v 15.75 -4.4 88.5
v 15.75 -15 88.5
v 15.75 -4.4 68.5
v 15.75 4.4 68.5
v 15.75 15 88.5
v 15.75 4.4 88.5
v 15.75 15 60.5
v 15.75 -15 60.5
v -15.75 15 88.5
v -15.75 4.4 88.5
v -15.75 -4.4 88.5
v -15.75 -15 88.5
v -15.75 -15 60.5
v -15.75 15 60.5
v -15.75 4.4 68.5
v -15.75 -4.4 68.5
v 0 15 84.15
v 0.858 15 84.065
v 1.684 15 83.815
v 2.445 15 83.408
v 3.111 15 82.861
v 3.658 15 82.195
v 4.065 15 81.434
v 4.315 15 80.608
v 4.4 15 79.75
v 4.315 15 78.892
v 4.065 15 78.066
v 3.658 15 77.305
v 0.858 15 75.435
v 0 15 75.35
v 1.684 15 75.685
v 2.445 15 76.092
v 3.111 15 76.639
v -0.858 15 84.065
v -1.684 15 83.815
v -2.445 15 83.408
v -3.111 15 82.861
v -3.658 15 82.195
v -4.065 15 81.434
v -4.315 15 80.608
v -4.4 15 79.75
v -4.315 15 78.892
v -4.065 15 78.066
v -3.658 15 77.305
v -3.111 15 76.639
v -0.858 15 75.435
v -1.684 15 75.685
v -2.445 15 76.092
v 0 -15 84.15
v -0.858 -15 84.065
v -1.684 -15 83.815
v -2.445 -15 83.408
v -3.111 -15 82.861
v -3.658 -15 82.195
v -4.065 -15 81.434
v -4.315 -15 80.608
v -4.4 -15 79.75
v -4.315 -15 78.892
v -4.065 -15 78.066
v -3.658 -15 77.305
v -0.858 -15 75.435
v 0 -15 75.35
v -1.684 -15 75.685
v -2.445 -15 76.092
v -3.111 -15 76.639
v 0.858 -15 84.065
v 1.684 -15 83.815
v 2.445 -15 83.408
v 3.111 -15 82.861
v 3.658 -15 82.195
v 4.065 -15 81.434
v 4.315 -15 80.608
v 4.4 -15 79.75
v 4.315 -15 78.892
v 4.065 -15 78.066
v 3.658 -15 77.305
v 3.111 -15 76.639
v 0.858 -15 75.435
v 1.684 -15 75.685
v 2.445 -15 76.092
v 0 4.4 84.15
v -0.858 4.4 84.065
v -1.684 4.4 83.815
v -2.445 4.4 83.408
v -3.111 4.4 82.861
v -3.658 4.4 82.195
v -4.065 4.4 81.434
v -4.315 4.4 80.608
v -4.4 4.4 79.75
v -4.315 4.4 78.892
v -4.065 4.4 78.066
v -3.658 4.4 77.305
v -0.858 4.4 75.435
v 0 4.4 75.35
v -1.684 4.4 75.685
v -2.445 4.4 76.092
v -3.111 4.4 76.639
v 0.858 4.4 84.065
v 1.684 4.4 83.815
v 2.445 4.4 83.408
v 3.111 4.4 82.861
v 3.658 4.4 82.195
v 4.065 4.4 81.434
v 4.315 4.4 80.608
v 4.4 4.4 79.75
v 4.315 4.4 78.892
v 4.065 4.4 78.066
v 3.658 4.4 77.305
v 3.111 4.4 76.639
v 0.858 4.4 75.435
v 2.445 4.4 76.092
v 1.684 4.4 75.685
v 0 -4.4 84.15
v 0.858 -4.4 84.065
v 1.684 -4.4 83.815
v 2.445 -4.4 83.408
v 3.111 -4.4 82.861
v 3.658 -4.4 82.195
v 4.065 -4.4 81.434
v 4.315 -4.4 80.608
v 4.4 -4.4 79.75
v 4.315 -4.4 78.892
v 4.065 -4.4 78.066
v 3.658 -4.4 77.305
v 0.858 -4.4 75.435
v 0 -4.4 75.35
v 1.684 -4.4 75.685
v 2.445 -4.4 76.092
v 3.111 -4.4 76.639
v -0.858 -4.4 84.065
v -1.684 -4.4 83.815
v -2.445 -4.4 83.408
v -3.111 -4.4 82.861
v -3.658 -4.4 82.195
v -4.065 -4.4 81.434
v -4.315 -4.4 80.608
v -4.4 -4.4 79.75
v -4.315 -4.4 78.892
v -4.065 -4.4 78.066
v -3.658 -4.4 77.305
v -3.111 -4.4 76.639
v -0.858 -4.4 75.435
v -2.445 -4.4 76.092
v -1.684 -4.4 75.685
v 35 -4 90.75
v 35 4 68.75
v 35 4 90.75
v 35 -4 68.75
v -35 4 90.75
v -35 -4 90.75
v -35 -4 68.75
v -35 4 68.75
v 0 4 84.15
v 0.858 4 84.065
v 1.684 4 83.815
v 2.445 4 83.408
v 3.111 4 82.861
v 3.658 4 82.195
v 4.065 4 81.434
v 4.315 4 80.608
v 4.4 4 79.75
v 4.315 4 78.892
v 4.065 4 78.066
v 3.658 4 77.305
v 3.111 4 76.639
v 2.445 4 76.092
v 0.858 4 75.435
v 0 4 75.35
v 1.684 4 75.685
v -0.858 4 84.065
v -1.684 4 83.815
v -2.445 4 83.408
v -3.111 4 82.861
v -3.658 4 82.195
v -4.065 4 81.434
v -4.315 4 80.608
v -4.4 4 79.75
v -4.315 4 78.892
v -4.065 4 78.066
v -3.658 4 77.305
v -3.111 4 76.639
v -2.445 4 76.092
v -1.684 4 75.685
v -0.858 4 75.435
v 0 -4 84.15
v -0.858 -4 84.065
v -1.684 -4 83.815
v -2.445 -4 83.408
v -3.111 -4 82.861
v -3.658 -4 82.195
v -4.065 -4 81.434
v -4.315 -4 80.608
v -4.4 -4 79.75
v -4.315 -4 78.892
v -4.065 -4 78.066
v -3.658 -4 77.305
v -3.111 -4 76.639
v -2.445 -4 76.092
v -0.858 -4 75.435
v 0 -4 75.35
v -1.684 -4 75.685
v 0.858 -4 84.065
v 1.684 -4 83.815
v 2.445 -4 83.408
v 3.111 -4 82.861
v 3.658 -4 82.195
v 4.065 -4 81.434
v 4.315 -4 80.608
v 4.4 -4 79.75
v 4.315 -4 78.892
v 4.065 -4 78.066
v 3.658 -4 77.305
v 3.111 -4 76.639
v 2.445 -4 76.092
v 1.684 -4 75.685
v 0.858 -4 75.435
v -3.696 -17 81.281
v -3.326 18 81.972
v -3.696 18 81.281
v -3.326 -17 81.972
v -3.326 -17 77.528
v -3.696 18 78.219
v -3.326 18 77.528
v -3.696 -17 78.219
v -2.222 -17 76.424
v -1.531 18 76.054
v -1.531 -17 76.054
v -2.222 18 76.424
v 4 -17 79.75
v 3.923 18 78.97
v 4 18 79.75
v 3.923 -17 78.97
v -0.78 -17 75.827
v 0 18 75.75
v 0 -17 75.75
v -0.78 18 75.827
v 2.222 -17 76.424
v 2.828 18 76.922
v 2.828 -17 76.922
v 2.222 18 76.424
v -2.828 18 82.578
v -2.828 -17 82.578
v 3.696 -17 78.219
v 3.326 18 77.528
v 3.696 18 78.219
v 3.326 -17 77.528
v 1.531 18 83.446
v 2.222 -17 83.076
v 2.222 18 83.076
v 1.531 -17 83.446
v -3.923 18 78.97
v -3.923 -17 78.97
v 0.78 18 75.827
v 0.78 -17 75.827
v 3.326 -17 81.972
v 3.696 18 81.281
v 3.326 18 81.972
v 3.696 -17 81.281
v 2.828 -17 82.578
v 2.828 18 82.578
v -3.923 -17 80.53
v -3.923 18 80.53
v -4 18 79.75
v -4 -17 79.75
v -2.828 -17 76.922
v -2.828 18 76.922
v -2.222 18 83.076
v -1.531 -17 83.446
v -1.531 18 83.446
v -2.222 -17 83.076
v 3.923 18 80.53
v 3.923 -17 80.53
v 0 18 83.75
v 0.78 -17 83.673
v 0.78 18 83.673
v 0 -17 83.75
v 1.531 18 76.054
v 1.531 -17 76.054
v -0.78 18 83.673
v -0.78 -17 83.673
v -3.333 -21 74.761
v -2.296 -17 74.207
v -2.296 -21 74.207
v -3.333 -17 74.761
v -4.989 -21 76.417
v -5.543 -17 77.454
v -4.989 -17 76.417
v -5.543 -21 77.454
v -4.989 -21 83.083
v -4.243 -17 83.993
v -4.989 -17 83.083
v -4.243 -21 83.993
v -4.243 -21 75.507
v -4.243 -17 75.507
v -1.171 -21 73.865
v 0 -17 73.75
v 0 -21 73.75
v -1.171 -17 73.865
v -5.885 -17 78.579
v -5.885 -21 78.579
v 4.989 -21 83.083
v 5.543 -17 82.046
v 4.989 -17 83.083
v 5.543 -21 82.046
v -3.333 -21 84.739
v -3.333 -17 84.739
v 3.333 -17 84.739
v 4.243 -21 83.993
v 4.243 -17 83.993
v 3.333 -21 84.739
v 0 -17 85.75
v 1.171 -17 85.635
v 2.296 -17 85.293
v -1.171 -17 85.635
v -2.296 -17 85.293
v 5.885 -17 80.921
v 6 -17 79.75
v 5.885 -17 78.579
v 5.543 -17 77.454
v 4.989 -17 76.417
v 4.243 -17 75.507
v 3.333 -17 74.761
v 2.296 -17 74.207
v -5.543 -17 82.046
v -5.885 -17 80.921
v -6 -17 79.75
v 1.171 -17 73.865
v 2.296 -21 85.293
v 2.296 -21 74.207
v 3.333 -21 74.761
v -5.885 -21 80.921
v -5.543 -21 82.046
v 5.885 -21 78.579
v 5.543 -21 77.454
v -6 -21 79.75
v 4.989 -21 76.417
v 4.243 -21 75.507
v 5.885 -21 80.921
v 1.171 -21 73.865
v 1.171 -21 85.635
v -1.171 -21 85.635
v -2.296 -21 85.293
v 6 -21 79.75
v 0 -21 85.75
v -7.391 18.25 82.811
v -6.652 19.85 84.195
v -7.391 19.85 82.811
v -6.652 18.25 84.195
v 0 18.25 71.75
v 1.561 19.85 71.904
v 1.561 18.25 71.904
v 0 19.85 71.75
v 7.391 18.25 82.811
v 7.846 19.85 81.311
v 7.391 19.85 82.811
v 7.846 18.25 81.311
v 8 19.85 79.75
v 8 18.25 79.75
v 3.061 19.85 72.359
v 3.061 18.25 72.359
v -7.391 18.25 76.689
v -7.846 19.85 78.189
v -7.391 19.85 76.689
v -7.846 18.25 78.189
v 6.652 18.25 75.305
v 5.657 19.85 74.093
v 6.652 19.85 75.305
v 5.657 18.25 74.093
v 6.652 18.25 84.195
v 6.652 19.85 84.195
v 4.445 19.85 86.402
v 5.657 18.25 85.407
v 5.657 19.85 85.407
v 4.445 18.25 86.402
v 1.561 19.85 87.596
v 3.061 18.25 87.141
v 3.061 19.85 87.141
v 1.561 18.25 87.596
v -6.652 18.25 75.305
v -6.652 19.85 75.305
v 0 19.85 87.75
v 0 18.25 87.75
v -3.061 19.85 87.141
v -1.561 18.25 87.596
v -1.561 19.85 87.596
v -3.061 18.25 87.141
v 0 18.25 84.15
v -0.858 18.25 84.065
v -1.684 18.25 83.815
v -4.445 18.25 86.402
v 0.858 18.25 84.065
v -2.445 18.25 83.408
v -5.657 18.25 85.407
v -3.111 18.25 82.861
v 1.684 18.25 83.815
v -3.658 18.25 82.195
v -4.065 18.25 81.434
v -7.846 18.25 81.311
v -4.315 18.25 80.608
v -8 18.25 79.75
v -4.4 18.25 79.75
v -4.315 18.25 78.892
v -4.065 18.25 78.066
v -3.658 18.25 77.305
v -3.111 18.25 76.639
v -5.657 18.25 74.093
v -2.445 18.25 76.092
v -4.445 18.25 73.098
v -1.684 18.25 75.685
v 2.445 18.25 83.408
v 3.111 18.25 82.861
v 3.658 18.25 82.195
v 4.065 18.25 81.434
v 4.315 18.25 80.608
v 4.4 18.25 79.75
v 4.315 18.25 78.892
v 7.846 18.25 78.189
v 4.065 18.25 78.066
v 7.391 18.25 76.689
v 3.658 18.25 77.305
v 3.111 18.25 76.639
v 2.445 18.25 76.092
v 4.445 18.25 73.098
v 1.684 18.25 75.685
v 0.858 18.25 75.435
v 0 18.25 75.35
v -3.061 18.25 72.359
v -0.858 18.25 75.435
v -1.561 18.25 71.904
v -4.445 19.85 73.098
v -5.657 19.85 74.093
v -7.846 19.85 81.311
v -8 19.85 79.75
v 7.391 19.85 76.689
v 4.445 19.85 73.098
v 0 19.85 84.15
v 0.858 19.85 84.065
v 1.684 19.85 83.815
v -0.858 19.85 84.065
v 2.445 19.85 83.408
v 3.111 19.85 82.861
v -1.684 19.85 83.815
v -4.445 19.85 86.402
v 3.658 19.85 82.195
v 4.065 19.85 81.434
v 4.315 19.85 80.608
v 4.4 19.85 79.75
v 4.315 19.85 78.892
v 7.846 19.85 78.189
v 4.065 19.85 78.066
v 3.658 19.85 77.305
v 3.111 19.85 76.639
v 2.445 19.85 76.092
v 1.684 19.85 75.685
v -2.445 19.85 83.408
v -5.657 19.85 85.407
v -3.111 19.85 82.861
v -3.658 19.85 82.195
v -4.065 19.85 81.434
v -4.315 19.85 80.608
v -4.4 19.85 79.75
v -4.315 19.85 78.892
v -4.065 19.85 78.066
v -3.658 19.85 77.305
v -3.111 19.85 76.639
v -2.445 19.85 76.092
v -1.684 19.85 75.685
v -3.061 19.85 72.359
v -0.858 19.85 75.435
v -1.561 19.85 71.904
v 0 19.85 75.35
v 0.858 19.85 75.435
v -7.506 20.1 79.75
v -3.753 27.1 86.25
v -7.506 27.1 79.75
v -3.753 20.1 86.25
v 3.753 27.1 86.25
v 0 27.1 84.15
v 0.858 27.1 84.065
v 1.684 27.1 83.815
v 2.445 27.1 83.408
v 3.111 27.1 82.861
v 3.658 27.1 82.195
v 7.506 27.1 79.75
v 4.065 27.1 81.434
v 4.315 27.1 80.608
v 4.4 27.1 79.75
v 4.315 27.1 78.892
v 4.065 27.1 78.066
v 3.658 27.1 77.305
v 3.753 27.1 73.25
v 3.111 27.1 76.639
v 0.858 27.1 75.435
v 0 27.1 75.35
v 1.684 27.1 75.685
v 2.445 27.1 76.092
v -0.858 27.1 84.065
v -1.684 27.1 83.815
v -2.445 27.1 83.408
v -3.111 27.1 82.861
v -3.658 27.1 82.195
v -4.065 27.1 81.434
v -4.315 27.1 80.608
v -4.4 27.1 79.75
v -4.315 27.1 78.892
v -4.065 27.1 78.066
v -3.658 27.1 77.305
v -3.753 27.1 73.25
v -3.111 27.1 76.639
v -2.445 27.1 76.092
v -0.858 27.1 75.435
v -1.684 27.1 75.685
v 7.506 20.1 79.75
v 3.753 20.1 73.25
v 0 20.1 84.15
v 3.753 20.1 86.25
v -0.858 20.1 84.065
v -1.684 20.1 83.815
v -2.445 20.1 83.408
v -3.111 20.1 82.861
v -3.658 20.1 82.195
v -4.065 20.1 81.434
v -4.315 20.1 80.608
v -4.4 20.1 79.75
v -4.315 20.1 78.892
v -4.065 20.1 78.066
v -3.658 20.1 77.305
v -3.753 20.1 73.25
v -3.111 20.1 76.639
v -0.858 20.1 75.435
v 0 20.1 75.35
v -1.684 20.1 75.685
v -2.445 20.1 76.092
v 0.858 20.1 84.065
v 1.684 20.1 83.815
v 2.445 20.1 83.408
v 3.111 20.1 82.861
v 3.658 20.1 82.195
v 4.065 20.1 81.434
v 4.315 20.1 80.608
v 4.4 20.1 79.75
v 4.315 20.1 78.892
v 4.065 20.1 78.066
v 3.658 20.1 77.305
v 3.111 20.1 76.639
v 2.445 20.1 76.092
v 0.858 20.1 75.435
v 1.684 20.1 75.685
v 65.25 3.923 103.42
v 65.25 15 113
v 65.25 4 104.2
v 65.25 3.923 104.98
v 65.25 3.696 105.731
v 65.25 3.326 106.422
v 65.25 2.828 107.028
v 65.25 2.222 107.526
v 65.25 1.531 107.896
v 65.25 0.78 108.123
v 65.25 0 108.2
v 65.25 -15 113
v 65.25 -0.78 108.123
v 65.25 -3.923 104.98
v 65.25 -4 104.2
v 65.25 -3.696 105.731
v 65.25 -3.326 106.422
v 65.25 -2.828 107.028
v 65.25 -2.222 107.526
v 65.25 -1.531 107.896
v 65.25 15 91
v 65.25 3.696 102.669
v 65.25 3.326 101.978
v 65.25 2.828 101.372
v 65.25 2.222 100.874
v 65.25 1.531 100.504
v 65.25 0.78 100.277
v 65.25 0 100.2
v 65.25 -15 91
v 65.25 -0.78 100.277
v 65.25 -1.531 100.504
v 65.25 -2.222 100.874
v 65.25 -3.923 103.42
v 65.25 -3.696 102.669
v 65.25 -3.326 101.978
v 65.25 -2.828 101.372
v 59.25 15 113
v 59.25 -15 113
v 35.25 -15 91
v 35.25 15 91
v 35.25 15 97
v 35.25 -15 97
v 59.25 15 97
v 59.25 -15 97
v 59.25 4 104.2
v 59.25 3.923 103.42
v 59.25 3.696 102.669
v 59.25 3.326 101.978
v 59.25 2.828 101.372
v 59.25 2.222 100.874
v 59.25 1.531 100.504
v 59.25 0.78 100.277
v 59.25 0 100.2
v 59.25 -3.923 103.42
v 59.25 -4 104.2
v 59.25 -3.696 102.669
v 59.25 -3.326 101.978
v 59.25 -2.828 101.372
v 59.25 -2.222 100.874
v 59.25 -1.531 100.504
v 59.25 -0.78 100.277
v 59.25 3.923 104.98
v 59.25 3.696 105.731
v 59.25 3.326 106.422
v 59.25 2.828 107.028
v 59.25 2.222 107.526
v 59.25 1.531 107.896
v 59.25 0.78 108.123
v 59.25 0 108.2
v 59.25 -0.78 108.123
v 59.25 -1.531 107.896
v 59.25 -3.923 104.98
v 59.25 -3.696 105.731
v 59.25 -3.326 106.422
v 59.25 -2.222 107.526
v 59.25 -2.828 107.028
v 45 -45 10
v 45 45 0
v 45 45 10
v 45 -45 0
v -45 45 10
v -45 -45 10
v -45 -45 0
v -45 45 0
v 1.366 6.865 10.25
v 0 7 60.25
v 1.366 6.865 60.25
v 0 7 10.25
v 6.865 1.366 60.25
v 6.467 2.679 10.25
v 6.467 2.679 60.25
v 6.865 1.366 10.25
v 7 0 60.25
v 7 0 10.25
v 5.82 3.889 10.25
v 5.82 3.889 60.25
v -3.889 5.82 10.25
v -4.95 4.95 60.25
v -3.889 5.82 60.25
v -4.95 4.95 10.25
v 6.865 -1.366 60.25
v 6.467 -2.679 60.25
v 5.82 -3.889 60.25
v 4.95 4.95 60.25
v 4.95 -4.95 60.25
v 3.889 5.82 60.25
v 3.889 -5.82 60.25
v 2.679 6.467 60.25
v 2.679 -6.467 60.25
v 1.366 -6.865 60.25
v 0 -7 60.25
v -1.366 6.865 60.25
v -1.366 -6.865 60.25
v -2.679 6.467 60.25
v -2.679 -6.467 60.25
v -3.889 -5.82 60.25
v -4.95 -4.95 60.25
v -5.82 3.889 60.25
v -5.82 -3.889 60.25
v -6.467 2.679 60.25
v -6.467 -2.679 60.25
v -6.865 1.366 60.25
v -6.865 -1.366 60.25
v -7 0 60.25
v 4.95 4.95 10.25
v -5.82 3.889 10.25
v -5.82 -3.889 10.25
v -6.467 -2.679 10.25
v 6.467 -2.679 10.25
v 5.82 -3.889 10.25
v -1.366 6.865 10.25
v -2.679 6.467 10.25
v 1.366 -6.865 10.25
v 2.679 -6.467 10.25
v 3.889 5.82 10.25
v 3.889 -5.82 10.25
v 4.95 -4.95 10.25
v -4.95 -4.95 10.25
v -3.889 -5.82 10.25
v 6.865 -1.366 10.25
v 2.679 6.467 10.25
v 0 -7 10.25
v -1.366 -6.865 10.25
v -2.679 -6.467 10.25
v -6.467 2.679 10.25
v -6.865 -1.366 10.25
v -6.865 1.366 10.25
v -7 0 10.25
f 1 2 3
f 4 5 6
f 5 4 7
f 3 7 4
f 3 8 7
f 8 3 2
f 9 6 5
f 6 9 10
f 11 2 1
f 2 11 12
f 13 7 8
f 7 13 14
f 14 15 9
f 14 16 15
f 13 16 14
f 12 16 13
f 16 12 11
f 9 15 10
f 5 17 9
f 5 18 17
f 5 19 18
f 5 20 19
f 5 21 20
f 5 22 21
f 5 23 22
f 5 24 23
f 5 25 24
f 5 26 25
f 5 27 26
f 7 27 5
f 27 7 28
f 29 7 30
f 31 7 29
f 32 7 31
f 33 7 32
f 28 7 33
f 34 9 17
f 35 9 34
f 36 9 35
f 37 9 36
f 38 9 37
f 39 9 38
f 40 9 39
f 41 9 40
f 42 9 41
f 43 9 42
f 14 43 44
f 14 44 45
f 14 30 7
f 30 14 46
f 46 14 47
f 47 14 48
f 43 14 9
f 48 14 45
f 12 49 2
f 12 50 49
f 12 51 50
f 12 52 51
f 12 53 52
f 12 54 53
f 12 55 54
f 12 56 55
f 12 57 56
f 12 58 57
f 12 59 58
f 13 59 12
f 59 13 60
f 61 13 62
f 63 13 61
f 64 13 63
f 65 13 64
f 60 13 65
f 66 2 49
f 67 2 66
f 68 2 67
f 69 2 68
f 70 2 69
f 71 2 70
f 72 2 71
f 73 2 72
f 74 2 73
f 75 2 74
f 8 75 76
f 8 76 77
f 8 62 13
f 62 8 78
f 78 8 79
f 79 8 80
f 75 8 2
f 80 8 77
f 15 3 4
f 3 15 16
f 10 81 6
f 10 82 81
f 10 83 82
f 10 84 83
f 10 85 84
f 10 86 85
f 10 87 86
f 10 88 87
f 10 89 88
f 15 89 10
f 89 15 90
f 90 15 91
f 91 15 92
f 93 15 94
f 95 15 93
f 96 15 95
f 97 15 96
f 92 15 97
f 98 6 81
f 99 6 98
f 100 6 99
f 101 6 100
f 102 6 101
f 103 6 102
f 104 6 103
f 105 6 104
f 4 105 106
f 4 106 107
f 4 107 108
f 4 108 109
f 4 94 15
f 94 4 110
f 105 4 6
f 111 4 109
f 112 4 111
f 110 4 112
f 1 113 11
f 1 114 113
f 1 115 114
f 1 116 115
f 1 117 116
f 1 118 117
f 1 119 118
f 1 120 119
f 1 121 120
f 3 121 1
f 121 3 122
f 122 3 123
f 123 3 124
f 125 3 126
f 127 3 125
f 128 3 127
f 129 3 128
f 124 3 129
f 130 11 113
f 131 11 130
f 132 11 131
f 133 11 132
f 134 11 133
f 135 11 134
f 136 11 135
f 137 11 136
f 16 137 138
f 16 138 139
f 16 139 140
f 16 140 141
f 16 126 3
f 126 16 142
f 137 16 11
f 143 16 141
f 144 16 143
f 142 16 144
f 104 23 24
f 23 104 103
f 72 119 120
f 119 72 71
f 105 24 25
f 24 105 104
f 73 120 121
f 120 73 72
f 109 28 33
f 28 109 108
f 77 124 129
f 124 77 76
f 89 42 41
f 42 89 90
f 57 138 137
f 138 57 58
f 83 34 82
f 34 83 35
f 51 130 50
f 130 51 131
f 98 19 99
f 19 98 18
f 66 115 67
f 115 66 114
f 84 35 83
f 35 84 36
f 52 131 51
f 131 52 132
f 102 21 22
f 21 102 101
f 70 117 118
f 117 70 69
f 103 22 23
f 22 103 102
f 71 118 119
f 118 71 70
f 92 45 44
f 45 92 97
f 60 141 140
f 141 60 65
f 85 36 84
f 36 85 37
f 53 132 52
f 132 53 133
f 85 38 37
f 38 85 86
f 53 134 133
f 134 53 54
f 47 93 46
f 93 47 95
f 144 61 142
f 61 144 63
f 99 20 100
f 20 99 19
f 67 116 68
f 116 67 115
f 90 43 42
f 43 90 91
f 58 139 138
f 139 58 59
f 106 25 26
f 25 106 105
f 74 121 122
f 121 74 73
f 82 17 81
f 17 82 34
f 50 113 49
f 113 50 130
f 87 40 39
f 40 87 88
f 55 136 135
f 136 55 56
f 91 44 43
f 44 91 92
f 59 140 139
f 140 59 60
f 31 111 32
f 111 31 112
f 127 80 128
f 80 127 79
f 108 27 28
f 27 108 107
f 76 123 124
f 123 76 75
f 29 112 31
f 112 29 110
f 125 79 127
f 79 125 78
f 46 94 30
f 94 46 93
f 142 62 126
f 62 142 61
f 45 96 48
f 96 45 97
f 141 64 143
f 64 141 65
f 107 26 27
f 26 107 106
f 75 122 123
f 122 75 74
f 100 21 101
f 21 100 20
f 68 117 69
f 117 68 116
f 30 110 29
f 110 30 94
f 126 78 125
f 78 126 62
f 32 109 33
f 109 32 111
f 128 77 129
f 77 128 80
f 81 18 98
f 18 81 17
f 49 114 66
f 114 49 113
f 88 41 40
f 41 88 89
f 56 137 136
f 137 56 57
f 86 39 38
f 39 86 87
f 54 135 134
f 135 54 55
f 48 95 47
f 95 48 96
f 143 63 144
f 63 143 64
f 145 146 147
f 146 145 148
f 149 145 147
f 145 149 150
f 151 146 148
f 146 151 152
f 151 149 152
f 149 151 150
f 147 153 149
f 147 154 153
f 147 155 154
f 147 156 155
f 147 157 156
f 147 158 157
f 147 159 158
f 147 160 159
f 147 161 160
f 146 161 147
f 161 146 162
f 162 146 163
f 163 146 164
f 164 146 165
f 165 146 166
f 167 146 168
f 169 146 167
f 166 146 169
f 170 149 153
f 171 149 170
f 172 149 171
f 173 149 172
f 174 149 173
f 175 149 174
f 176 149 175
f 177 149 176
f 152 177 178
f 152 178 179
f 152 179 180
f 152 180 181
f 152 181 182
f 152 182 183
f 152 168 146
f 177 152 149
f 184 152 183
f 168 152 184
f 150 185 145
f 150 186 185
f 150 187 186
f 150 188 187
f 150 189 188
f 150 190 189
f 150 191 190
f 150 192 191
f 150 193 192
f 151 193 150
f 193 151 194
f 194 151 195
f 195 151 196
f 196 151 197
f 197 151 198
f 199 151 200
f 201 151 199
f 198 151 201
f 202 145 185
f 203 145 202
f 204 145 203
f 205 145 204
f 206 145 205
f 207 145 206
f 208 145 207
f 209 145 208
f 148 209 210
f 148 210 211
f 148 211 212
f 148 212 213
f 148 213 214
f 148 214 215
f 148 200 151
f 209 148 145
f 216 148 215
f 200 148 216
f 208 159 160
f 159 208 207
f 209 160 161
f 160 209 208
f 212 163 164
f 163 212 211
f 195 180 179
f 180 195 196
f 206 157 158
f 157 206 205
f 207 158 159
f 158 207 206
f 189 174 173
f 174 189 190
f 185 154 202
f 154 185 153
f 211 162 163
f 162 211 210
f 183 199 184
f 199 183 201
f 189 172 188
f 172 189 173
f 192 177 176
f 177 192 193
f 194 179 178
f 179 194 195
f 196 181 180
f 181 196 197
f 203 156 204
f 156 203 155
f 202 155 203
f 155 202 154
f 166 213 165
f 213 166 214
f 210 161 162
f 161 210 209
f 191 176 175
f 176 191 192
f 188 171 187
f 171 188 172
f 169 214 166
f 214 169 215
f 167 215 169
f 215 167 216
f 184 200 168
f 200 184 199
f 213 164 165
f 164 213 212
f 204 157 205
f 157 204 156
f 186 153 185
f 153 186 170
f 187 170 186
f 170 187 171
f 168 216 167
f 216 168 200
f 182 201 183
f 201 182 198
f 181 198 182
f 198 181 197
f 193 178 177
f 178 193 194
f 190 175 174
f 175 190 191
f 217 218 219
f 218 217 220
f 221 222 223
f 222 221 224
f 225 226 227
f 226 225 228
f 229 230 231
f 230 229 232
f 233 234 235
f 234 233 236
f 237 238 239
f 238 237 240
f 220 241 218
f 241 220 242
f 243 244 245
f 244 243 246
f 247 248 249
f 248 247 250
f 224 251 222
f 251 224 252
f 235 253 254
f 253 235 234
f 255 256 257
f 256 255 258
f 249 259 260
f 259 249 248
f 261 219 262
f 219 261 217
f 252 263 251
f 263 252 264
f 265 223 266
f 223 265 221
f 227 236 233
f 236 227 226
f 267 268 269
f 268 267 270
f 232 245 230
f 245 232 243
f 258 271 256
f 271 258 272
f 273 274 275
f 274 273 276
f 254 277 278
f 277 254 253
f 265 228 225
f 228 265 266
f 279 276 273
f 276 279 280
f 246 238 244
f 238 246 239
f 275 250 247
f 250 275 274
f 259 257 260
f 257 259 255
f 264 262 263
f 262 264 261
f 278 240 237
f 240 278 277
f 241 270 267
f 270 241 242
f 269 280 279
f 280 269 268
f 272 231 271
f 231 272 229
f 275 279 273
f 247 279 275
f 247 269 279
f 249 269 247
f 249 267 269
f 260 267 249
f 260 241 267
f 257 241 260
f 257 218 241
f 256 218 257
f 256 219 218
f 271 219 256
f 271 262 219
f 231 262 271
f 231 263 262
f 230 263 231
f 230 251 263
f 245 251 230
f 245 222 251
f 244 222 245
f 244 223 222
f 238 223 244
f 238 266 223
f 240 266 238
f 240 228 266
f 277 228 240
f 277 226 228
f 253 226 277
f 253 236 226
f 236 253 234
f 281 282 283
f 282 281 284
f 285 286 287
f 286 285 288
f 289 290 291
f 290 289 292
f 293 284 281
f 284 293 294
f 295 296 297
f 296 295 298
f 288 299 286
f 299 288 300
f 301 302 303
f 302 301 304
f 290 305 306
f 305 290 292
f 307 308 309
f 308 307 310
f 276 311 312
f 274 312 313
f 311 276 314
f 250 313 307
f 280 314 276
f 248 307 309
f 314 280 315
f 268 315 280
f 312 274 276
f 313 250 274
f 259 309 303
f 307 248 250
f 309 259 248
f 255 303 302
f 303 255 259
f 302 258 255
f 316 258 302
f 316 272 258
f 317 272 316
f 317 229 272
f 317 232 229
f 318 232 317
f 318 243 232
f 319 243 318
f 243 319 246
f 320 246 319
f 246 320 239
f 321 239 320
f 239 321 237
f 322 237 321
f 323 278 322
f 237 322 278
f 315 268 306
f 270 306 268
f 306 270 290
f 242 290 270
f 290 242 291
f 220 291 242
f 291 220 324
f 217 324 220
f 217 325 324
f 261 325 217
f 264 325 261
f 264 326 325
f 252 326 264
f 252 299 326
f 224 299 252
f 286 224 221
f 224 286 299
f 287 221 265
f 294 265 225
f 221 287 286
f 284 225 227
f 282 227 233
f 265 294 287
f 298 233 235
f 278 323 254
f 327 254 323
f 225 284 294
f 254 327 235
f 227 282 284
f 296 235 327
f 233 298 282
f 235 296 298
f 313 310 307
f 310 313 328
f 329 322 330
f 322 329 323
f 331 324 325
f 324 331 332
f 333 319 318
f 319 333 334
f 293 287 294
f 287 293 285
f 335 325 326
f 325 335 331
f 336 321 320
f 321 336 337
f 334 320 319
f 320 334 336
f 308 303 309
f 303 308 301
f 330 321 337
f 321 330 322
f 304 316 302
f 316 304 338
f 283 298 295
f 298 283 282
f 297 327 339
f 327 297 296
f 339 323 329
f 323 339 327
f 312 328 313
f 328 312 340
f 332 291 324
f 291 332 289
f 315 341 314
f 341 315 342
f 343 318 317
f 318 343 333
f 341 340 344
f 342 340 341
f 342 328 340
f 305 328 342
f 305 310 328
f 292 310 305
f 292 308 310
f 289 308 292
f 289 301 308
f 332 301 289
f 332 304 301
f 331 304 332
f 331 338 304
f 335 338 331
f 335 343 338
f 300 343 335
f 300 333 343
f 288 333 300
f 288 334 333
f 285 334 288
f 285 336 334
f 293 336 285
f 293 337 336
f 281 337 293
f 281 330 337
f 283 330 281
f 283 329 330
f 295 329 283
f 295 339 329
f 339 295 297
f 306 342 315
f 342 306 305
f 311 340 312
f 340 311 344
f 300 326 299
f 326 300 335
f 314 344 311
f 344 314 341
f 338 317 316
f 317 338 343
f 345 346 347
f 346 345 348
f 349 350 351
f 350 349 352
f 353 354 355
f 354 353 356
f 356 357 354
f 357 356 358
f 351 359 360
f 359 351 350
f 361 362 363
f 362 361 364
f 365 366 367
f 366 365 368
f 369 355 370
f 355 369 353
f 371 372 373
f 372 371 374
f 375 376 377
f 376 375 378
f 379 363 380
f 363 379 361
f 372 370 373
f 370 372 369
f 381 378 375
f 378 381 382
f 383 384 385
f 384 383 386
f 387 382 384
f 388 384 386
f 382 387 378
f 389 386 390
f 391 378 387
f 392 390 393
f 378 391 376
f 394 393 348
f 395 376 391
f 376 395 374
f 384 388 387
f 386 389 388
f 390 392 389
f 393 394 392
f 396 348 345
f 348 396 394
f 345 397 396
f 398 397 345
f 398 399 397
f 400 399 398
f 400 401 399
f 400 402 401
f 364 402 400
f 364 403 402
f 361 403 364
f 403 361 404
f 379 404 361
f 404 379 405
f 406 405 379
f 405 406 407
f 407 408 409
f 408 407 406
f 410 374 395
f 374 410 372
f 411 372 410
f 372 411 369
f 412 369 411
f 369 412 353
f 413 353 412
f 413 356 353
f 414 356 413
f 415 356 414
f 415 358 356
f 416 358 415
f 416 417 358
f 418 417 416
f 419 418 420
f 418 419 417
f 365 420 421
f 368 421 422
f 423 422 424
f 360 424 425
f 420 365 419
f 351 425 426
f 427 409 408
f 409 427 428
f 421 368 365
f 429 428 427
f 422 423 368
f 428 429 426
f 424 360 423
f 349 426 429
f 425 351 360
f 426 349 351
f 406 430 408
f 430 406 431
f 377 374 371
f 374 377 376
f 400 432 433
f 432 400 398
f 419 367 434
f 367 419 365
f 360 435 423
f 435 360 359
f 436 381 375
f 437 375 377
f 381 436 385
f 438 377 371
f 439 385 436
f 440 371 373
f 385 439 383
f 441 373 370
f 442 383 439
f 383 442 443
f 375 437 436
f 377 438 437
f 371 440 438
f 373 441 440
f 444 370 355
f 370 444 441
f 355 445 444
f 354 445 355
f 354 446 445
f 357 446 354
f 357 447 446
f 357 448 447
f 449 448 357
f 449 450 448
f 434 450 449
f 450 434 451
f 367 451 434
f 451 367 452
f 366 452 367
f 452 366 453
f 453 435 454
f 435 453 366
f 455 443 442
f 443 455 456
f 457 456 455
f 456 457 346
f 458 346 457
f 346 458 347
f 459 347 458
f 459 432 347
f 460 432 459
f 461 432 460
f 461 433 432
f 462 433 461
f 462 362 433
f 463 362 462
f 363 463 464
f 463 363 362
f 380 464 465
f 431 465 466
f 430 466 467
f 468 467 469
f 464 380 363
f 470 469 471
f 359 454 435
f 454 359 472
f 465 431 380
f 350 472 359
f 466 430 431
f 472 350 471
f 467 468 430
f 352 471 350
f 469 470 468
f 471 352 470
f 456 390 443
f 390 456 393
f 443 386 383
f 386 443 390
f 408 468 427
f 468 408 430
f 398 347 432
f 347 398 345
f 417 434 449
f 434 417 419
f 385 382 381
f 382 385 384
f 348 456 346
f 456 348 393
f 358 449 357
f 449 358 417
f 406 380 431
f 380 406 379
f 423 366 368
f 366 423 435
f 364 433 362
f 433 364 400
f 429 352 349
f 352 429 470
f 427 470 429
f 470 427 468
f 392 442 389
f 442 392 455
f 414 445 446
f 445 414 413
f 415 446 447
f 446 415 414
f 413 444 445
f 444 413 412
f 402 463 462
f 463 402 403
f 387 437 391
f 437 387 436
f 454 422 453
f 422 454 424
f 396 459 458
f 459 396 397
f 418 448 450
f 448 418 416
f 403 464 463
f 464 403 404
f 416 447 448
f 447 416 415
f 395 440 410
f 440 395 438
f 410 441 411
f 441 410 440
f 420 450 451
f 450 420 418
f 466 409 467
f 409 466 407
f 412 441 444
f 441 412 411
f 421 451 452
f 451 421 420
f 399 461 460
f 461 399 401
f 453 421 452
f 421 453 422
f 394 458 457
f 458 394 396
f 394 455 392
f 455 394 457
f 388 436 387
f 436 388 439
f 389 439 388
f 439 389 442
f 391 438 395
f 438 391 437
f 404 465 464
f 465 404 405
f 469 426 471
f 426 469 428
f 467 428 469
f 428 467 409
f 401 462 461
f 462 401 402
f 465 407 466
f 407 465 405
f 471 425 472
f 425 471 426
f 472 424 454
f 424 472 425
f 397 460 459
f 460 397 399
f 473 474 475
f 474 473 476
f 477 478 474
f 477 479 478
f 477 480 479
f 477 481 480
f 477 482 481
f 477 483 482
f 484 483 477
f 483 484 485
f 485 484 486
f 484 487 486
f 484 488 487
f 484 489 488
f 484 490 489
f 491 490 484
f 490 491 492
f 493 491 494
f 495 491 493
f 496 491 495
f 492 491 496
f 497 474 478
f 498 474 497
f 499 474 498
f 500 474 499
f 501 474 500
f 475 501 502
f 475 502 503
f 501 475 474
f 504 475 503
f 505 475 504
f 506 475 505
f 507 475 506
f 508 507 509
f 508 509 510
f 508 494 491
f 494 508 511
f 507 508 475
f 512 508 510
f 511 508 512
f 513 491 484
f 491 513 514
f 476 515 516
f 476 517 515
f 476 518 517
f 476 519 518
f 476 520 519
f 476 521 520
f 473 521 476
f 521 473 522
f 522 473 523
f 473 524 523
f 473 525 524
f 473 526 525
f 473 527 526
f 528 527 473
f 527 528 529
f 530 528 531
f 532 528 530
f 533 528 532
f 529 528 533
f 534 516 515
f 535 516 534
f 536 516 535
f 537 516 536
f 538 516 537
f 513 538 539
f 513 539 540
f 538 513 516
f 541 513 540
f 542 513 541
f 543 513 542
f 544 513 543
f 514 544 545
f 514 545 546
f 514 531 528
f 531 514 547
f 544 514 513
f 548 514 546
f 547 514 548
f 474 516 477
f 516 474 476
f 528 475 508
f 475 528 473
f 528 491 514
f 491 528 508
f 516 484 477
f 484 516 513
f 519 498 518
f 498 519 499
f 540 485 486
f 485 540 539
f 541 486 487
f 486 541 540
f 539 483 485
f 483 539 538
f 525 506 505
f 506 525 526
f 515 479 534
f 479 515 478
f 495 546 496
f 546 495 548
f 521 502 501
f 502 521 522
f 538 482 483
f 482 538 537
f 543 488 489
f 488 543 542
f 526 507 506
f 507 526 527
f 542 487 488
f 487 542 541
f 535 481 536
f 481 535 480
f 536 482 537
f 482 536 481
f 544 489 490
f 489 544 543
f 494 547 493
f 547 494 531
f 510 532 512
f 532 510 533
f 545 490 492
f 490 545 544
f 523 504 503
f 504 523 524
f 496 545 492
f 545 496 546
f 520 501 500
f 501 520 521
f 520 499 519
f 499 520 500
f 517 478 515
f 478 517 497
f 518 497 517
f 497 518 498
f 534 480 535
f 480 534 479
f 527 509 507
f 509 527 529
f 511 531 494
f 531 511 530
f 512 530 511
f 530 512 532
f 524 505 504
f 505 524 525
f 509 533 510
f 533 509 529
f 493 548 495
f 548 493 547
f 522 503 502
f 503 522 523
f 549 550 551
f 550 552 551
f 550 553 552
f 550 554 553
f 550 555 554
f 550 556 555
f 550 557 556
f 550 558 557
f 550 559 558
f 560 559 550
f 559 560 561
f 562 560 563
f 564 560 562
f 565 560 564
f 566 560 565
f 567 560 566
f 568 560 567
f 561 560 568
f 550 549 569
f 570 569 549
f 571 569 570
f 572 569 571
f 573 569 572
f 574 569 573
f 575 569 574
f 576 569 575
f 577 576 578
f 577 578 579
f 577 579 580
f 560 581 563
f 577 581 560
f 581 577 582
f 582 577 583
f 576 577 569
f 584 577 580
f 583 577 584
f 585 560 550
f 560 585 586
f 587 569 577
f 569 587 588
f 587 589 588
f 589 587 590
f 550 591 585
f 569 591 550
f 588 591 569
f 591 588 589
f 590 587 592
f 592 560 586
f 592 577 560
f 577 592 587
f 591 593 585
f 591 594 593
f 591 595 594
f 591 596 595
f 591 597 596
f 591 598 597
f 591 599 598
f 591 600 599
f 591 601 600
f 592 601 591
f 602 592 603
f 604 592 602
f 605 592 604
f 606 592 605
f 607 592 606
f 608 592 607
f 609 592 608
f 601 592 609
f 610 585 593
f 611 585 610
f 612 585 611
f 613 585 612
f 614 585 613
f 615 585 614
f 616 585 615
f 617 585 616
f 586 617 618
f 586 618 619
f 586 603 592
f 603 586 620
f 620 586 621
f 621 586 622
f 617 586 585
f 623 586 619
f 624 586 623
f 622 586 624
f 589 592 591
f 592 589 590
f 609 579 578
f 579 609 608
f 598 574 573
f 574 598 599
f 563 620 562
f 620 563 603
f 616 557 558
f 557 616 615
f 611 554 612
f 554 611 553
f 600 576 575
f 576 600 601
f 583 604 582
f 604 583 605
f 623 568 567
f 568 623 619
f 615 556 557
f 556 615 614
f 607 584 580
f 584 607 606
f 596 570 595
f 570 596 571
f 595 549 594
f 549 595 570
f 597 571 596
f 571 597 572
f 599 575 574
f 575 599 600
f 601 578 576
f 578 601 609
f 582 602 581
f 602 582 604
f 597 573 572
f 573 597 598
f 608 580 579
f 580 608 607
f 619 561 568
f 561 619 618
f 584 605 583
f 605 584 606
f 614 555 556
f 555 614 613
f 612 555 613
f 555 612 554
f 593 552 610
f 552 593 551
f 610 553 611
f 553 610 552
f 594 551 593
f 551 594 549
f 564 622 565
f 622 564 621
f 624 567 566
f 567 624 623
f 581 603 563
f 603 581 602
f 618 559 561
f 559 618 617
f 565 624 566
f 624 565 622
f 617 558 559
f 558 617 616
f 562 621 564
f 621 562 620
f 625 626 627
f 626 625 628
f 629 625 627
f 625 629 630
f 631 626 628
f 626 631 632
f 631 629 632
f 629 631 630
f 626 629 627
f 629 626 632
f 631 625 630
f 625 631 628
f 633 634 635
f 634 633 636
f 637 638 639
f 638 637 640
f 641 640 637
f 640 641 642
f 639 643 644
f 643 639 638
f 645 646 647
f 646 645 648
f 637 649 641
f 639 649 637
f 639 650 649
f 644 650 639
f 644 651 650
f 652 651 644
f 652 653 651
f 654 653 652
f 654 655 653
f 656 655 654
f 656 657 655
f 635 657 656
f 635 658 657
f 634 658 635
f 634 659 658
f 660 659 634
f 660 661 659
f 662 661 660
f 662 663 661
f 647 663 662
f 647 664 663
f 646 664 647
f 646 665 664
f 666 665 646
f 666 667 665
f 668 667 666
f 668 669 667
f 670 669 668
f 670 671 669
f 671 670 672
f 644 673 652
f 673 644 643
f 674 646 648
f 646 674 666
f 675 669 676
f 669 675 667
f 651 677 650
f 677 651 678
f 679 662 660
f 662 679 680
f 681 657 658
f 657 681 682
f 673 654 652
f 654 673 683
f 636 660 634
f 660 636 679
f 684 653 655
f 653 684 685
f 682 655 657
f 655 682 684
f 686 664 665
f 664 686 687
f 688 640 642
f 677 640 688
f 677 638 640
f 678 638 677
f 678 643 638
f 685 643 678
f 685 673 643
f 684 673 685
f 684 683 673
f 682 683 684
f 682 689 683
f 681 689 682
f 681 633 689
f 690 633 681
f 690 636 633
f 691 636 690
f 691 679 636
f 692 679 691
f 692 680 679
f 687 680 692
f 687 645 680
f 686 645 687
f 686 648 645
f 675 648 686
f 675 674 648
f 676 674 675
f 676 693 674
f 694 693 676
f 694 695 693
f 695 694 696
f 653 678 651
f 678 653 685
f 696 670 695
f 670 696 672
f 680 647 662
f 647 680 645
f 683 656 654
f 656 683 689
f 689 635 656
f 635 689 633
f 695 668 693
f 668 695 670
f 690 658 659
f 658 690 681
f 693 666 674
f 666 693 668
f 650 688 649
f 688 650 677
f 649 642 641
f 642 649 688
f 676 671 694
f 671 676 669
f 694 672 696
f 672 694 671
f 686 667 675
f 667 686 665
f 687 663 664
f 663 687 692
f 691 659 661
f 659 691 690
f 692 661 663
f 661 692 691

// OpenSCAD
$fn = 32;

// ------------------------------------------------------------------------
// Lamp arm: column d14 x 50 mm, arm 70 mm
// Every part is its own module, assembly() places every instance.
// ------------------------------------------------------------------------

// --- part 1 ---
module lamp_base() {
  difference() {
    translate([-45, -45, 0]) cube([90, 90, 10]);
  }
}

// --- part 2 ---
module lamp_column() {
  cylinder(h = 50, d = 14);
}

// --- part 3 ---
module head_fork() {
  difference() {
    translate([-15.75, -15, 0]) cube([31.5, 30, 28]);
    translate([-16.75, -4.4, 8]) cube([33.5, 8.8, 21]);
    translate([0, 0, 19.25]) rotate([90, 0, 0]) cylinder(h = 32, d = 8.8, center = true);
  }
}

// --- part 4 ---
module lamp_arm() {
  difference() {
    translate([-35, -4, 0]) cube([70, 8, 22]);
    translate([0, 0, 11]) rotate([90, 0, 0]) cylinder(h = 10, d = 8.8, center = true);
  }
}

// --- part 5 ---
module arm_pin() {
  rotate([0, 90, 0]) cylinder(h = 36, d = 8, center = true);
  translate([-21, 0, 0]) rotate([0, 90, 0]) cylinder(h = 4, d = 12);
}

// --- part 6 ---
module arm_washer() {
  difference() {
      translate([0, 0, 0]) cylinder(h = 1.6, d = 16);
      translate([0, 0, -1]) cylinder(h = 3.6, d = 8.8);
    }
}

// --- part 7 ---
module arm_nut() {
  difference() {
    linear_extrude(height = 7) polygon(points = [[7.506, 0], [3.753, 6.5], [-3.753, 6.5], [-7.506, 0], [-3.753, -6.5], [3.753, -6.5]]);
    translate([0, 0, -1]) cylinder(h = 9, d = 8.8);
  }
}

// --- part 8 ---
module shade_bracket() {
  difference() {
    translate([-15, -15, 0]) cube([30, 30, 22]);
    translate([-16, -16, 6]) cube([25, 32, 17]);
    translate([12, 0, 13.2]) rotate([0, 90, 0]) cylinder(h = 8, d = 8, center = true);
  }
}

// --- assembly ---
module assembly() {
  color([0.80, 0.24, 0.20]) translate([0, 0, 0]) rotate([0, 0, 0]) lamp_base();
  color([0.20, 0.45, 0.75]) translate([0, 0, 10.25]) rotate([0, 0, 0]) lamp_column();
  color([0.25, 0.62, 0.32]) translate([0, 0, 60.5]) rotate([0, 0, 0]) head_fork();
  color([0.92, 0.70, 0.18]) translate([0, 0, 68.75]) rotate([0, 0, 0]) lamp_arm();
  color([0.58, 0.35, 0.70]) translate([0, 0, 79.75]) rotate([0, 0, 90]) arm_pin();
  color([0.16, 0.66, 0.66]) translate([0, 19.85, 79.75]) rotate([90, 0, 0]) arm_washer();
  color([0.85, 0.48, 0.18]) translate([0, 27.1, 79.75]) rotate([90, 0, 0]) arm_nut();
  color([0.55, 0.60, 0.65]) translate([50.25, 0, 91]) rotate([0, 0, 0]) shade_bracket();
}

assembly();
